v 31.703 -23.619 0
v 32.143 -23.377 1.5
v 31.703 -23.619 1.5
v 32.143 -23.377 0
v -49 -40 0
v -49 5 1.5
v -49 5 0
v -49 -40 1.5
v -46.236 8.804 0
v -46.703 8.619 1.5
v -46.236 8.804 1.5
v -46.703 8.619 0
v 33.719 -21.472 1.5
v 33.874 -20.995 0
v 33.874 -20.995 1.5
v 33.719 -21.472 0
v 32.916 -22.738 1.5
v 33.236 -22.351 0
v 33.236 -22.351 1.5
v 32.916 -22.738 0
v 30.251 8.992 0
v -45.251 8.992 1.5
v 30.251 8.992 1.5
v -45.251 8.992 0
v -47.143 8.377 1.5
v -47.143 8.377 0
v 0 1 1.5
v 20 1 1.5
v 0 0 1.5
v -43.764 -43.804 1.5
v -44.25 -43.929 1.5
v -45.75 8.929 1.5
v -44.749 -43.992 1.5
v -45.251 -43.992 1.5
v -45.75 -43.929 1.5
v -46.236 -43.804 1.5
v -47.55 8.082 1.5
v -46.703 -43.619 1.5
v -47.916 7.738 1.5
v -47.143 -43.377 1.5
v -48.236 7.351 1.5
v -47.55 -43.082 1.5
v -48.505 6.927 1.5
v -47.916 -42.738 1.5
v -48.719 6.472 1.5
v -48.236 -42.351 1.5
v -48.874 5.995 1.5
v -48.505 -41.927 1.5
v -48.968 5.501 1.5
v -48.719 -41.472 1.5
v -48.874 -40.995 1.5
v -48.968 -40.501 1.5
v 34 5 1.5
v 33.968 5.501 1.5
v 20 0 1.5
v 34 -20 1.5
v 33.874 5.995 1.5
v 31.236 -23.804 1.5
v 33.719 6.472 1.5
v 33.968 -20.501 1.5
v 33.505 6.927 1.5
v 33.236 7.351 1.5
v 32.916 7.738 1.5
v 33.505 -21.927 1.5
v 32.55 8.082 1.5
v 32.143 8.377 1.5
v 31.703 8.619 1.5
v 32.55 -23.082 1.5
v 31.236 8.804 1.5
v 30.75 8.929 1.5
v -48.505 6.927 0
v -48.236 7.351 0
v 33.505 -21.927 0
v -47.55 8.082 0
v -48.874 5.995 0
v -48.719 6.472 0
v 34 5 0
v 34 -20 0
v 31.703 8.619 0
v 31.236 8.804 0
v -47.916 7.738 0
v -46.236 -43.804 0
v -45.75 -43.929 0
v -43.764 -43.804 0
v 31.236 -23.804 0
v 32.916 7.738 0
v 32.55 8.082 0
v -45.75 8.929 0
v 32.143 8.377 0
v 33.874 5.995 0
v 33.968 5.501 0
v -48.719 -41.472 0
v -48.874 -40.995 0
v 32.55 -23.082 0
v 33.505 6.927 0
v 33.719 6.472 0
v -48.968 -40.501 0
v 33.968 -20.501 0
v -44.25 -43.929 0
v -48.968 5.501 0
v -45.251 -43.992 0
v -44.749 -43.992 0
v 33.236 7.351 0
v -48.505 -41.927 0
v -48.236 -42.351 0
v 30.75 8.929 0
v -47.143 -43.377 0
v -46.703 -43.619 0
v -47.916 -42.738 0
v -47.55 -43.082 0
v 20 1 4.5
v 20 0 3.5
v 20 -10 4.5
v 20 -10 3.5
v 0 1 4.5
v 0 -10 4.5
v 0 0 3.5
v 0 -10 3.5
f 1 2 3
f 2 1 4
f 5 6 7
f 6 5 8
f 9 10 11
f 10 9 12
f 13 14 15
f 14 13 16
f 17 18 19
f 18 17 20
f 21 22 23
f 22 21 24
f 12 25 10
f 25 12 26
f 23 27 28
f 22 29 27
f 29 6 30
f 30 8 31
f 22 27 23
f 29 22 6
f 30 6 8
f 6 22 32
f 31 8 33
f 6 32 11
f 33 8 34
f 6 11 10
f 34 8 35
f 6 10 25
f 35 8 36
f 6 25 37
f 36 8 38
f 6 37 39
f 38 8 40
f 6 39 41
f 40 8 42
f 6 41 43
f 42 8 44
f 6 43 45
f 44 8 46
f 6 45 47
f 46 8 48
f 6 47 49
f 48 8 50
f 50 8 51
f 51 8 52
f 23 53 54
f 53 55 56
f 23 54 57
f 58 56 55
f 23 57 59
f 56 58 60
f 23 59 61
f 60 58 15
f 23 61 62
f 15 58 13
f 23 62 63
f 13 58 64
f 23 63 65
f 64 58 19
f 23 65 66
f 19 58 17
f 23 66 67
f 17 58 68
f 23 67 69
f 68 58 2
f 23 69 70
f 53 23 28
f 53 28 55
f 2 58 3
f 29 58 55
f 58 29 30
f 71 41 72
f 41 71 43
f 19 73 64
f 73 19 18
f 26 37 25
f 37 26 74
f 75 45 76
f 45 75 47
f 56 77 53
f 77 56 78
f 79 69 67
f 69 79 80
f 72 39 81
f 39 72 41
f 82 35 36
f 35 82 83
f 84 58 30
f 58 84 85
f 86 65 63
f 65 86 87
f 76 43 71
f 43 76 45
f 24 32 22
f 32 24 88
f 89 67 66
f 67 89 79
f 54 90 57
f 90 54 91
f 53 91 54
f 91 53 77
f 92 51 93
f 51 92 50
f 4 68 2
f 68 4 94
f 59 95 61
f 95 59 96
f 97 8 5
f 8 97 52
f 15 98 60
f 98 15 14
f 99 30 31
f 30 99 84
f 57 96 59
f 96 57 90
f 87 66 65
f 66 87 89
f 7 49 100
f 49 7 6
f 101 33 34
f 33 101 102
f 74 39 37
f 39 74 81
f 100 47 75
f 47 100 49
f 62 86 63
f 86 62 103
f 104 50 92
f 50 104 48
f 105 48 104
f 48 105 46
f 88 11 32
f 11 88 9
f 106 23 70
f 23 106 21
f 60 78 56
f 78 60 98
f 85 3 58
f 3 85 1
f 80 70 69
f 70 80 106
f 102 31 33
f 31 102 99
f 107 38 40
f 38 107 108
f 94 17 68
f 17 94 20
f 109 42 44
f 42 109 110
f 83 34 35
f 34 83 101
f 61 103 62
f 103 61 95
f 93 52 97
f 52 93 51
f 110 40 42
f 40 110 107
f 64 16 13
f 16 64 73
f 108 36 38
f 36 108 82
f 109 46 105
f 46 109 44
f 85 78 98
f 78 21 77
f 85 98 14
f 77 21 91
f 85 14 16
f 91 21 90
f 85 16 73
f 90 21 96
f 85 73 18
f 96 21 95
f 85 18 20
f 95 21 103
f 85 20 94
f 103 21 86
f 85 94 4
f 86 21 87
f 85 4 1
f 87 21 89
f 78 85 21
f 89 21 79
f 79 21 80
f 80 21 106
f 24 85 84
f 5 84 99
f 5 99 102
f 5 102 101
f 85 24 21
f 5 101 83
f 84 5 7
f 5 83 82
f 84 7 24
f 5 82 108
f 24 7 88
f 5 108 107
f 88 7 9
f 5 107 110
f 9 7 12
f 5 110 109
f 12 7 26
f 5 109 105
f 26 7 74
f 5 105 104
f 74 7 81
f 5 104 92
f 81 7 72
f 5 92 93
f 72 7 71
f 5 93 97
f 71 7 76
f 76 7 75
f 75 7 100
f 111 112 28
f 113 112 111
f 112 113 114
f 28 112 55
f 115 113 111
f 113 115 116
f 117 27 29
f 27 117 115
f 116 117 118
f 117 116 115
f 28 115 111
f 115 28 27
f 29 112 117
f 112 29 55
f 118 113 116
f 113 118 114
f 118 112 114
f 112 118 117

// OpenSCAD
$fn=50;

CORNER_RADIUS = 4;

// thickness of the shield
SHEILD_THICKNESS = 1.5;

// length, thickness and height of the clip that attaches to the glasses
CLIP_LENGTH = 20;
CLIP_THICKNESS = 1;
CLIP_HEIGHT = 10;

// width of the glasses arm
ARM_WIDTH = 2;

// by default the blinder for the right is rendered. Enable mirroring to render the left side
MIRROR = false;

//  only render the arm clip in order to test sizing.
ONLY_PRINT_CLIP = false;

module blinder() {
  // shield
  hull() {
      translate([-45, 5, 0]) cylinder(SHEILD_THICKNESS, r = CORNER_RADIUS); // top - front
      translate([30, 5, 0]) cylinder(SHEILD_THICKNESS, r = CORNER_RADIUS); // top - back
      translate([30, -20, 0]) cylinder(SHEILD_THICKNESS, r = CORNER_RADIUS); // bottom - back
      translate([-45, -40, 0]) cylinder(SHEILD_THICKNESS, r = CORNER_RADIUS); // bottom - front
  }

  // clip - horizontal part
  cube([CLIP_LENGTH, CLIP_THICKNESS, ARM_WIDTH + CLIP_THICKNESS + SHEILD_THICKNESS]);

  // clip - vertical part
  translate([0, 0, SHEILD_THICKNESS + ARM_WIDTH]) rotate([90, 0, 0]) cube([CLIP_LENGTH, CLIP_THICKNESS, CLIP_HEIGHT]);
}

if (ONLY_PRINT_CLIP) {
  intersection() {
    blinder();
    translate([-5, -(CLIP_HEIGHT + 5), 0]) cube([CLIP_LENGTH + 10, 100, SHEILD_THICKNESS + ARM_WIDTH + CLIP_THICKNESS]);
  }
} else {
  if (MIRROR) {
    mirror([1, 0, 0]) blinder();
  } else {
    blinder();
  }
}
